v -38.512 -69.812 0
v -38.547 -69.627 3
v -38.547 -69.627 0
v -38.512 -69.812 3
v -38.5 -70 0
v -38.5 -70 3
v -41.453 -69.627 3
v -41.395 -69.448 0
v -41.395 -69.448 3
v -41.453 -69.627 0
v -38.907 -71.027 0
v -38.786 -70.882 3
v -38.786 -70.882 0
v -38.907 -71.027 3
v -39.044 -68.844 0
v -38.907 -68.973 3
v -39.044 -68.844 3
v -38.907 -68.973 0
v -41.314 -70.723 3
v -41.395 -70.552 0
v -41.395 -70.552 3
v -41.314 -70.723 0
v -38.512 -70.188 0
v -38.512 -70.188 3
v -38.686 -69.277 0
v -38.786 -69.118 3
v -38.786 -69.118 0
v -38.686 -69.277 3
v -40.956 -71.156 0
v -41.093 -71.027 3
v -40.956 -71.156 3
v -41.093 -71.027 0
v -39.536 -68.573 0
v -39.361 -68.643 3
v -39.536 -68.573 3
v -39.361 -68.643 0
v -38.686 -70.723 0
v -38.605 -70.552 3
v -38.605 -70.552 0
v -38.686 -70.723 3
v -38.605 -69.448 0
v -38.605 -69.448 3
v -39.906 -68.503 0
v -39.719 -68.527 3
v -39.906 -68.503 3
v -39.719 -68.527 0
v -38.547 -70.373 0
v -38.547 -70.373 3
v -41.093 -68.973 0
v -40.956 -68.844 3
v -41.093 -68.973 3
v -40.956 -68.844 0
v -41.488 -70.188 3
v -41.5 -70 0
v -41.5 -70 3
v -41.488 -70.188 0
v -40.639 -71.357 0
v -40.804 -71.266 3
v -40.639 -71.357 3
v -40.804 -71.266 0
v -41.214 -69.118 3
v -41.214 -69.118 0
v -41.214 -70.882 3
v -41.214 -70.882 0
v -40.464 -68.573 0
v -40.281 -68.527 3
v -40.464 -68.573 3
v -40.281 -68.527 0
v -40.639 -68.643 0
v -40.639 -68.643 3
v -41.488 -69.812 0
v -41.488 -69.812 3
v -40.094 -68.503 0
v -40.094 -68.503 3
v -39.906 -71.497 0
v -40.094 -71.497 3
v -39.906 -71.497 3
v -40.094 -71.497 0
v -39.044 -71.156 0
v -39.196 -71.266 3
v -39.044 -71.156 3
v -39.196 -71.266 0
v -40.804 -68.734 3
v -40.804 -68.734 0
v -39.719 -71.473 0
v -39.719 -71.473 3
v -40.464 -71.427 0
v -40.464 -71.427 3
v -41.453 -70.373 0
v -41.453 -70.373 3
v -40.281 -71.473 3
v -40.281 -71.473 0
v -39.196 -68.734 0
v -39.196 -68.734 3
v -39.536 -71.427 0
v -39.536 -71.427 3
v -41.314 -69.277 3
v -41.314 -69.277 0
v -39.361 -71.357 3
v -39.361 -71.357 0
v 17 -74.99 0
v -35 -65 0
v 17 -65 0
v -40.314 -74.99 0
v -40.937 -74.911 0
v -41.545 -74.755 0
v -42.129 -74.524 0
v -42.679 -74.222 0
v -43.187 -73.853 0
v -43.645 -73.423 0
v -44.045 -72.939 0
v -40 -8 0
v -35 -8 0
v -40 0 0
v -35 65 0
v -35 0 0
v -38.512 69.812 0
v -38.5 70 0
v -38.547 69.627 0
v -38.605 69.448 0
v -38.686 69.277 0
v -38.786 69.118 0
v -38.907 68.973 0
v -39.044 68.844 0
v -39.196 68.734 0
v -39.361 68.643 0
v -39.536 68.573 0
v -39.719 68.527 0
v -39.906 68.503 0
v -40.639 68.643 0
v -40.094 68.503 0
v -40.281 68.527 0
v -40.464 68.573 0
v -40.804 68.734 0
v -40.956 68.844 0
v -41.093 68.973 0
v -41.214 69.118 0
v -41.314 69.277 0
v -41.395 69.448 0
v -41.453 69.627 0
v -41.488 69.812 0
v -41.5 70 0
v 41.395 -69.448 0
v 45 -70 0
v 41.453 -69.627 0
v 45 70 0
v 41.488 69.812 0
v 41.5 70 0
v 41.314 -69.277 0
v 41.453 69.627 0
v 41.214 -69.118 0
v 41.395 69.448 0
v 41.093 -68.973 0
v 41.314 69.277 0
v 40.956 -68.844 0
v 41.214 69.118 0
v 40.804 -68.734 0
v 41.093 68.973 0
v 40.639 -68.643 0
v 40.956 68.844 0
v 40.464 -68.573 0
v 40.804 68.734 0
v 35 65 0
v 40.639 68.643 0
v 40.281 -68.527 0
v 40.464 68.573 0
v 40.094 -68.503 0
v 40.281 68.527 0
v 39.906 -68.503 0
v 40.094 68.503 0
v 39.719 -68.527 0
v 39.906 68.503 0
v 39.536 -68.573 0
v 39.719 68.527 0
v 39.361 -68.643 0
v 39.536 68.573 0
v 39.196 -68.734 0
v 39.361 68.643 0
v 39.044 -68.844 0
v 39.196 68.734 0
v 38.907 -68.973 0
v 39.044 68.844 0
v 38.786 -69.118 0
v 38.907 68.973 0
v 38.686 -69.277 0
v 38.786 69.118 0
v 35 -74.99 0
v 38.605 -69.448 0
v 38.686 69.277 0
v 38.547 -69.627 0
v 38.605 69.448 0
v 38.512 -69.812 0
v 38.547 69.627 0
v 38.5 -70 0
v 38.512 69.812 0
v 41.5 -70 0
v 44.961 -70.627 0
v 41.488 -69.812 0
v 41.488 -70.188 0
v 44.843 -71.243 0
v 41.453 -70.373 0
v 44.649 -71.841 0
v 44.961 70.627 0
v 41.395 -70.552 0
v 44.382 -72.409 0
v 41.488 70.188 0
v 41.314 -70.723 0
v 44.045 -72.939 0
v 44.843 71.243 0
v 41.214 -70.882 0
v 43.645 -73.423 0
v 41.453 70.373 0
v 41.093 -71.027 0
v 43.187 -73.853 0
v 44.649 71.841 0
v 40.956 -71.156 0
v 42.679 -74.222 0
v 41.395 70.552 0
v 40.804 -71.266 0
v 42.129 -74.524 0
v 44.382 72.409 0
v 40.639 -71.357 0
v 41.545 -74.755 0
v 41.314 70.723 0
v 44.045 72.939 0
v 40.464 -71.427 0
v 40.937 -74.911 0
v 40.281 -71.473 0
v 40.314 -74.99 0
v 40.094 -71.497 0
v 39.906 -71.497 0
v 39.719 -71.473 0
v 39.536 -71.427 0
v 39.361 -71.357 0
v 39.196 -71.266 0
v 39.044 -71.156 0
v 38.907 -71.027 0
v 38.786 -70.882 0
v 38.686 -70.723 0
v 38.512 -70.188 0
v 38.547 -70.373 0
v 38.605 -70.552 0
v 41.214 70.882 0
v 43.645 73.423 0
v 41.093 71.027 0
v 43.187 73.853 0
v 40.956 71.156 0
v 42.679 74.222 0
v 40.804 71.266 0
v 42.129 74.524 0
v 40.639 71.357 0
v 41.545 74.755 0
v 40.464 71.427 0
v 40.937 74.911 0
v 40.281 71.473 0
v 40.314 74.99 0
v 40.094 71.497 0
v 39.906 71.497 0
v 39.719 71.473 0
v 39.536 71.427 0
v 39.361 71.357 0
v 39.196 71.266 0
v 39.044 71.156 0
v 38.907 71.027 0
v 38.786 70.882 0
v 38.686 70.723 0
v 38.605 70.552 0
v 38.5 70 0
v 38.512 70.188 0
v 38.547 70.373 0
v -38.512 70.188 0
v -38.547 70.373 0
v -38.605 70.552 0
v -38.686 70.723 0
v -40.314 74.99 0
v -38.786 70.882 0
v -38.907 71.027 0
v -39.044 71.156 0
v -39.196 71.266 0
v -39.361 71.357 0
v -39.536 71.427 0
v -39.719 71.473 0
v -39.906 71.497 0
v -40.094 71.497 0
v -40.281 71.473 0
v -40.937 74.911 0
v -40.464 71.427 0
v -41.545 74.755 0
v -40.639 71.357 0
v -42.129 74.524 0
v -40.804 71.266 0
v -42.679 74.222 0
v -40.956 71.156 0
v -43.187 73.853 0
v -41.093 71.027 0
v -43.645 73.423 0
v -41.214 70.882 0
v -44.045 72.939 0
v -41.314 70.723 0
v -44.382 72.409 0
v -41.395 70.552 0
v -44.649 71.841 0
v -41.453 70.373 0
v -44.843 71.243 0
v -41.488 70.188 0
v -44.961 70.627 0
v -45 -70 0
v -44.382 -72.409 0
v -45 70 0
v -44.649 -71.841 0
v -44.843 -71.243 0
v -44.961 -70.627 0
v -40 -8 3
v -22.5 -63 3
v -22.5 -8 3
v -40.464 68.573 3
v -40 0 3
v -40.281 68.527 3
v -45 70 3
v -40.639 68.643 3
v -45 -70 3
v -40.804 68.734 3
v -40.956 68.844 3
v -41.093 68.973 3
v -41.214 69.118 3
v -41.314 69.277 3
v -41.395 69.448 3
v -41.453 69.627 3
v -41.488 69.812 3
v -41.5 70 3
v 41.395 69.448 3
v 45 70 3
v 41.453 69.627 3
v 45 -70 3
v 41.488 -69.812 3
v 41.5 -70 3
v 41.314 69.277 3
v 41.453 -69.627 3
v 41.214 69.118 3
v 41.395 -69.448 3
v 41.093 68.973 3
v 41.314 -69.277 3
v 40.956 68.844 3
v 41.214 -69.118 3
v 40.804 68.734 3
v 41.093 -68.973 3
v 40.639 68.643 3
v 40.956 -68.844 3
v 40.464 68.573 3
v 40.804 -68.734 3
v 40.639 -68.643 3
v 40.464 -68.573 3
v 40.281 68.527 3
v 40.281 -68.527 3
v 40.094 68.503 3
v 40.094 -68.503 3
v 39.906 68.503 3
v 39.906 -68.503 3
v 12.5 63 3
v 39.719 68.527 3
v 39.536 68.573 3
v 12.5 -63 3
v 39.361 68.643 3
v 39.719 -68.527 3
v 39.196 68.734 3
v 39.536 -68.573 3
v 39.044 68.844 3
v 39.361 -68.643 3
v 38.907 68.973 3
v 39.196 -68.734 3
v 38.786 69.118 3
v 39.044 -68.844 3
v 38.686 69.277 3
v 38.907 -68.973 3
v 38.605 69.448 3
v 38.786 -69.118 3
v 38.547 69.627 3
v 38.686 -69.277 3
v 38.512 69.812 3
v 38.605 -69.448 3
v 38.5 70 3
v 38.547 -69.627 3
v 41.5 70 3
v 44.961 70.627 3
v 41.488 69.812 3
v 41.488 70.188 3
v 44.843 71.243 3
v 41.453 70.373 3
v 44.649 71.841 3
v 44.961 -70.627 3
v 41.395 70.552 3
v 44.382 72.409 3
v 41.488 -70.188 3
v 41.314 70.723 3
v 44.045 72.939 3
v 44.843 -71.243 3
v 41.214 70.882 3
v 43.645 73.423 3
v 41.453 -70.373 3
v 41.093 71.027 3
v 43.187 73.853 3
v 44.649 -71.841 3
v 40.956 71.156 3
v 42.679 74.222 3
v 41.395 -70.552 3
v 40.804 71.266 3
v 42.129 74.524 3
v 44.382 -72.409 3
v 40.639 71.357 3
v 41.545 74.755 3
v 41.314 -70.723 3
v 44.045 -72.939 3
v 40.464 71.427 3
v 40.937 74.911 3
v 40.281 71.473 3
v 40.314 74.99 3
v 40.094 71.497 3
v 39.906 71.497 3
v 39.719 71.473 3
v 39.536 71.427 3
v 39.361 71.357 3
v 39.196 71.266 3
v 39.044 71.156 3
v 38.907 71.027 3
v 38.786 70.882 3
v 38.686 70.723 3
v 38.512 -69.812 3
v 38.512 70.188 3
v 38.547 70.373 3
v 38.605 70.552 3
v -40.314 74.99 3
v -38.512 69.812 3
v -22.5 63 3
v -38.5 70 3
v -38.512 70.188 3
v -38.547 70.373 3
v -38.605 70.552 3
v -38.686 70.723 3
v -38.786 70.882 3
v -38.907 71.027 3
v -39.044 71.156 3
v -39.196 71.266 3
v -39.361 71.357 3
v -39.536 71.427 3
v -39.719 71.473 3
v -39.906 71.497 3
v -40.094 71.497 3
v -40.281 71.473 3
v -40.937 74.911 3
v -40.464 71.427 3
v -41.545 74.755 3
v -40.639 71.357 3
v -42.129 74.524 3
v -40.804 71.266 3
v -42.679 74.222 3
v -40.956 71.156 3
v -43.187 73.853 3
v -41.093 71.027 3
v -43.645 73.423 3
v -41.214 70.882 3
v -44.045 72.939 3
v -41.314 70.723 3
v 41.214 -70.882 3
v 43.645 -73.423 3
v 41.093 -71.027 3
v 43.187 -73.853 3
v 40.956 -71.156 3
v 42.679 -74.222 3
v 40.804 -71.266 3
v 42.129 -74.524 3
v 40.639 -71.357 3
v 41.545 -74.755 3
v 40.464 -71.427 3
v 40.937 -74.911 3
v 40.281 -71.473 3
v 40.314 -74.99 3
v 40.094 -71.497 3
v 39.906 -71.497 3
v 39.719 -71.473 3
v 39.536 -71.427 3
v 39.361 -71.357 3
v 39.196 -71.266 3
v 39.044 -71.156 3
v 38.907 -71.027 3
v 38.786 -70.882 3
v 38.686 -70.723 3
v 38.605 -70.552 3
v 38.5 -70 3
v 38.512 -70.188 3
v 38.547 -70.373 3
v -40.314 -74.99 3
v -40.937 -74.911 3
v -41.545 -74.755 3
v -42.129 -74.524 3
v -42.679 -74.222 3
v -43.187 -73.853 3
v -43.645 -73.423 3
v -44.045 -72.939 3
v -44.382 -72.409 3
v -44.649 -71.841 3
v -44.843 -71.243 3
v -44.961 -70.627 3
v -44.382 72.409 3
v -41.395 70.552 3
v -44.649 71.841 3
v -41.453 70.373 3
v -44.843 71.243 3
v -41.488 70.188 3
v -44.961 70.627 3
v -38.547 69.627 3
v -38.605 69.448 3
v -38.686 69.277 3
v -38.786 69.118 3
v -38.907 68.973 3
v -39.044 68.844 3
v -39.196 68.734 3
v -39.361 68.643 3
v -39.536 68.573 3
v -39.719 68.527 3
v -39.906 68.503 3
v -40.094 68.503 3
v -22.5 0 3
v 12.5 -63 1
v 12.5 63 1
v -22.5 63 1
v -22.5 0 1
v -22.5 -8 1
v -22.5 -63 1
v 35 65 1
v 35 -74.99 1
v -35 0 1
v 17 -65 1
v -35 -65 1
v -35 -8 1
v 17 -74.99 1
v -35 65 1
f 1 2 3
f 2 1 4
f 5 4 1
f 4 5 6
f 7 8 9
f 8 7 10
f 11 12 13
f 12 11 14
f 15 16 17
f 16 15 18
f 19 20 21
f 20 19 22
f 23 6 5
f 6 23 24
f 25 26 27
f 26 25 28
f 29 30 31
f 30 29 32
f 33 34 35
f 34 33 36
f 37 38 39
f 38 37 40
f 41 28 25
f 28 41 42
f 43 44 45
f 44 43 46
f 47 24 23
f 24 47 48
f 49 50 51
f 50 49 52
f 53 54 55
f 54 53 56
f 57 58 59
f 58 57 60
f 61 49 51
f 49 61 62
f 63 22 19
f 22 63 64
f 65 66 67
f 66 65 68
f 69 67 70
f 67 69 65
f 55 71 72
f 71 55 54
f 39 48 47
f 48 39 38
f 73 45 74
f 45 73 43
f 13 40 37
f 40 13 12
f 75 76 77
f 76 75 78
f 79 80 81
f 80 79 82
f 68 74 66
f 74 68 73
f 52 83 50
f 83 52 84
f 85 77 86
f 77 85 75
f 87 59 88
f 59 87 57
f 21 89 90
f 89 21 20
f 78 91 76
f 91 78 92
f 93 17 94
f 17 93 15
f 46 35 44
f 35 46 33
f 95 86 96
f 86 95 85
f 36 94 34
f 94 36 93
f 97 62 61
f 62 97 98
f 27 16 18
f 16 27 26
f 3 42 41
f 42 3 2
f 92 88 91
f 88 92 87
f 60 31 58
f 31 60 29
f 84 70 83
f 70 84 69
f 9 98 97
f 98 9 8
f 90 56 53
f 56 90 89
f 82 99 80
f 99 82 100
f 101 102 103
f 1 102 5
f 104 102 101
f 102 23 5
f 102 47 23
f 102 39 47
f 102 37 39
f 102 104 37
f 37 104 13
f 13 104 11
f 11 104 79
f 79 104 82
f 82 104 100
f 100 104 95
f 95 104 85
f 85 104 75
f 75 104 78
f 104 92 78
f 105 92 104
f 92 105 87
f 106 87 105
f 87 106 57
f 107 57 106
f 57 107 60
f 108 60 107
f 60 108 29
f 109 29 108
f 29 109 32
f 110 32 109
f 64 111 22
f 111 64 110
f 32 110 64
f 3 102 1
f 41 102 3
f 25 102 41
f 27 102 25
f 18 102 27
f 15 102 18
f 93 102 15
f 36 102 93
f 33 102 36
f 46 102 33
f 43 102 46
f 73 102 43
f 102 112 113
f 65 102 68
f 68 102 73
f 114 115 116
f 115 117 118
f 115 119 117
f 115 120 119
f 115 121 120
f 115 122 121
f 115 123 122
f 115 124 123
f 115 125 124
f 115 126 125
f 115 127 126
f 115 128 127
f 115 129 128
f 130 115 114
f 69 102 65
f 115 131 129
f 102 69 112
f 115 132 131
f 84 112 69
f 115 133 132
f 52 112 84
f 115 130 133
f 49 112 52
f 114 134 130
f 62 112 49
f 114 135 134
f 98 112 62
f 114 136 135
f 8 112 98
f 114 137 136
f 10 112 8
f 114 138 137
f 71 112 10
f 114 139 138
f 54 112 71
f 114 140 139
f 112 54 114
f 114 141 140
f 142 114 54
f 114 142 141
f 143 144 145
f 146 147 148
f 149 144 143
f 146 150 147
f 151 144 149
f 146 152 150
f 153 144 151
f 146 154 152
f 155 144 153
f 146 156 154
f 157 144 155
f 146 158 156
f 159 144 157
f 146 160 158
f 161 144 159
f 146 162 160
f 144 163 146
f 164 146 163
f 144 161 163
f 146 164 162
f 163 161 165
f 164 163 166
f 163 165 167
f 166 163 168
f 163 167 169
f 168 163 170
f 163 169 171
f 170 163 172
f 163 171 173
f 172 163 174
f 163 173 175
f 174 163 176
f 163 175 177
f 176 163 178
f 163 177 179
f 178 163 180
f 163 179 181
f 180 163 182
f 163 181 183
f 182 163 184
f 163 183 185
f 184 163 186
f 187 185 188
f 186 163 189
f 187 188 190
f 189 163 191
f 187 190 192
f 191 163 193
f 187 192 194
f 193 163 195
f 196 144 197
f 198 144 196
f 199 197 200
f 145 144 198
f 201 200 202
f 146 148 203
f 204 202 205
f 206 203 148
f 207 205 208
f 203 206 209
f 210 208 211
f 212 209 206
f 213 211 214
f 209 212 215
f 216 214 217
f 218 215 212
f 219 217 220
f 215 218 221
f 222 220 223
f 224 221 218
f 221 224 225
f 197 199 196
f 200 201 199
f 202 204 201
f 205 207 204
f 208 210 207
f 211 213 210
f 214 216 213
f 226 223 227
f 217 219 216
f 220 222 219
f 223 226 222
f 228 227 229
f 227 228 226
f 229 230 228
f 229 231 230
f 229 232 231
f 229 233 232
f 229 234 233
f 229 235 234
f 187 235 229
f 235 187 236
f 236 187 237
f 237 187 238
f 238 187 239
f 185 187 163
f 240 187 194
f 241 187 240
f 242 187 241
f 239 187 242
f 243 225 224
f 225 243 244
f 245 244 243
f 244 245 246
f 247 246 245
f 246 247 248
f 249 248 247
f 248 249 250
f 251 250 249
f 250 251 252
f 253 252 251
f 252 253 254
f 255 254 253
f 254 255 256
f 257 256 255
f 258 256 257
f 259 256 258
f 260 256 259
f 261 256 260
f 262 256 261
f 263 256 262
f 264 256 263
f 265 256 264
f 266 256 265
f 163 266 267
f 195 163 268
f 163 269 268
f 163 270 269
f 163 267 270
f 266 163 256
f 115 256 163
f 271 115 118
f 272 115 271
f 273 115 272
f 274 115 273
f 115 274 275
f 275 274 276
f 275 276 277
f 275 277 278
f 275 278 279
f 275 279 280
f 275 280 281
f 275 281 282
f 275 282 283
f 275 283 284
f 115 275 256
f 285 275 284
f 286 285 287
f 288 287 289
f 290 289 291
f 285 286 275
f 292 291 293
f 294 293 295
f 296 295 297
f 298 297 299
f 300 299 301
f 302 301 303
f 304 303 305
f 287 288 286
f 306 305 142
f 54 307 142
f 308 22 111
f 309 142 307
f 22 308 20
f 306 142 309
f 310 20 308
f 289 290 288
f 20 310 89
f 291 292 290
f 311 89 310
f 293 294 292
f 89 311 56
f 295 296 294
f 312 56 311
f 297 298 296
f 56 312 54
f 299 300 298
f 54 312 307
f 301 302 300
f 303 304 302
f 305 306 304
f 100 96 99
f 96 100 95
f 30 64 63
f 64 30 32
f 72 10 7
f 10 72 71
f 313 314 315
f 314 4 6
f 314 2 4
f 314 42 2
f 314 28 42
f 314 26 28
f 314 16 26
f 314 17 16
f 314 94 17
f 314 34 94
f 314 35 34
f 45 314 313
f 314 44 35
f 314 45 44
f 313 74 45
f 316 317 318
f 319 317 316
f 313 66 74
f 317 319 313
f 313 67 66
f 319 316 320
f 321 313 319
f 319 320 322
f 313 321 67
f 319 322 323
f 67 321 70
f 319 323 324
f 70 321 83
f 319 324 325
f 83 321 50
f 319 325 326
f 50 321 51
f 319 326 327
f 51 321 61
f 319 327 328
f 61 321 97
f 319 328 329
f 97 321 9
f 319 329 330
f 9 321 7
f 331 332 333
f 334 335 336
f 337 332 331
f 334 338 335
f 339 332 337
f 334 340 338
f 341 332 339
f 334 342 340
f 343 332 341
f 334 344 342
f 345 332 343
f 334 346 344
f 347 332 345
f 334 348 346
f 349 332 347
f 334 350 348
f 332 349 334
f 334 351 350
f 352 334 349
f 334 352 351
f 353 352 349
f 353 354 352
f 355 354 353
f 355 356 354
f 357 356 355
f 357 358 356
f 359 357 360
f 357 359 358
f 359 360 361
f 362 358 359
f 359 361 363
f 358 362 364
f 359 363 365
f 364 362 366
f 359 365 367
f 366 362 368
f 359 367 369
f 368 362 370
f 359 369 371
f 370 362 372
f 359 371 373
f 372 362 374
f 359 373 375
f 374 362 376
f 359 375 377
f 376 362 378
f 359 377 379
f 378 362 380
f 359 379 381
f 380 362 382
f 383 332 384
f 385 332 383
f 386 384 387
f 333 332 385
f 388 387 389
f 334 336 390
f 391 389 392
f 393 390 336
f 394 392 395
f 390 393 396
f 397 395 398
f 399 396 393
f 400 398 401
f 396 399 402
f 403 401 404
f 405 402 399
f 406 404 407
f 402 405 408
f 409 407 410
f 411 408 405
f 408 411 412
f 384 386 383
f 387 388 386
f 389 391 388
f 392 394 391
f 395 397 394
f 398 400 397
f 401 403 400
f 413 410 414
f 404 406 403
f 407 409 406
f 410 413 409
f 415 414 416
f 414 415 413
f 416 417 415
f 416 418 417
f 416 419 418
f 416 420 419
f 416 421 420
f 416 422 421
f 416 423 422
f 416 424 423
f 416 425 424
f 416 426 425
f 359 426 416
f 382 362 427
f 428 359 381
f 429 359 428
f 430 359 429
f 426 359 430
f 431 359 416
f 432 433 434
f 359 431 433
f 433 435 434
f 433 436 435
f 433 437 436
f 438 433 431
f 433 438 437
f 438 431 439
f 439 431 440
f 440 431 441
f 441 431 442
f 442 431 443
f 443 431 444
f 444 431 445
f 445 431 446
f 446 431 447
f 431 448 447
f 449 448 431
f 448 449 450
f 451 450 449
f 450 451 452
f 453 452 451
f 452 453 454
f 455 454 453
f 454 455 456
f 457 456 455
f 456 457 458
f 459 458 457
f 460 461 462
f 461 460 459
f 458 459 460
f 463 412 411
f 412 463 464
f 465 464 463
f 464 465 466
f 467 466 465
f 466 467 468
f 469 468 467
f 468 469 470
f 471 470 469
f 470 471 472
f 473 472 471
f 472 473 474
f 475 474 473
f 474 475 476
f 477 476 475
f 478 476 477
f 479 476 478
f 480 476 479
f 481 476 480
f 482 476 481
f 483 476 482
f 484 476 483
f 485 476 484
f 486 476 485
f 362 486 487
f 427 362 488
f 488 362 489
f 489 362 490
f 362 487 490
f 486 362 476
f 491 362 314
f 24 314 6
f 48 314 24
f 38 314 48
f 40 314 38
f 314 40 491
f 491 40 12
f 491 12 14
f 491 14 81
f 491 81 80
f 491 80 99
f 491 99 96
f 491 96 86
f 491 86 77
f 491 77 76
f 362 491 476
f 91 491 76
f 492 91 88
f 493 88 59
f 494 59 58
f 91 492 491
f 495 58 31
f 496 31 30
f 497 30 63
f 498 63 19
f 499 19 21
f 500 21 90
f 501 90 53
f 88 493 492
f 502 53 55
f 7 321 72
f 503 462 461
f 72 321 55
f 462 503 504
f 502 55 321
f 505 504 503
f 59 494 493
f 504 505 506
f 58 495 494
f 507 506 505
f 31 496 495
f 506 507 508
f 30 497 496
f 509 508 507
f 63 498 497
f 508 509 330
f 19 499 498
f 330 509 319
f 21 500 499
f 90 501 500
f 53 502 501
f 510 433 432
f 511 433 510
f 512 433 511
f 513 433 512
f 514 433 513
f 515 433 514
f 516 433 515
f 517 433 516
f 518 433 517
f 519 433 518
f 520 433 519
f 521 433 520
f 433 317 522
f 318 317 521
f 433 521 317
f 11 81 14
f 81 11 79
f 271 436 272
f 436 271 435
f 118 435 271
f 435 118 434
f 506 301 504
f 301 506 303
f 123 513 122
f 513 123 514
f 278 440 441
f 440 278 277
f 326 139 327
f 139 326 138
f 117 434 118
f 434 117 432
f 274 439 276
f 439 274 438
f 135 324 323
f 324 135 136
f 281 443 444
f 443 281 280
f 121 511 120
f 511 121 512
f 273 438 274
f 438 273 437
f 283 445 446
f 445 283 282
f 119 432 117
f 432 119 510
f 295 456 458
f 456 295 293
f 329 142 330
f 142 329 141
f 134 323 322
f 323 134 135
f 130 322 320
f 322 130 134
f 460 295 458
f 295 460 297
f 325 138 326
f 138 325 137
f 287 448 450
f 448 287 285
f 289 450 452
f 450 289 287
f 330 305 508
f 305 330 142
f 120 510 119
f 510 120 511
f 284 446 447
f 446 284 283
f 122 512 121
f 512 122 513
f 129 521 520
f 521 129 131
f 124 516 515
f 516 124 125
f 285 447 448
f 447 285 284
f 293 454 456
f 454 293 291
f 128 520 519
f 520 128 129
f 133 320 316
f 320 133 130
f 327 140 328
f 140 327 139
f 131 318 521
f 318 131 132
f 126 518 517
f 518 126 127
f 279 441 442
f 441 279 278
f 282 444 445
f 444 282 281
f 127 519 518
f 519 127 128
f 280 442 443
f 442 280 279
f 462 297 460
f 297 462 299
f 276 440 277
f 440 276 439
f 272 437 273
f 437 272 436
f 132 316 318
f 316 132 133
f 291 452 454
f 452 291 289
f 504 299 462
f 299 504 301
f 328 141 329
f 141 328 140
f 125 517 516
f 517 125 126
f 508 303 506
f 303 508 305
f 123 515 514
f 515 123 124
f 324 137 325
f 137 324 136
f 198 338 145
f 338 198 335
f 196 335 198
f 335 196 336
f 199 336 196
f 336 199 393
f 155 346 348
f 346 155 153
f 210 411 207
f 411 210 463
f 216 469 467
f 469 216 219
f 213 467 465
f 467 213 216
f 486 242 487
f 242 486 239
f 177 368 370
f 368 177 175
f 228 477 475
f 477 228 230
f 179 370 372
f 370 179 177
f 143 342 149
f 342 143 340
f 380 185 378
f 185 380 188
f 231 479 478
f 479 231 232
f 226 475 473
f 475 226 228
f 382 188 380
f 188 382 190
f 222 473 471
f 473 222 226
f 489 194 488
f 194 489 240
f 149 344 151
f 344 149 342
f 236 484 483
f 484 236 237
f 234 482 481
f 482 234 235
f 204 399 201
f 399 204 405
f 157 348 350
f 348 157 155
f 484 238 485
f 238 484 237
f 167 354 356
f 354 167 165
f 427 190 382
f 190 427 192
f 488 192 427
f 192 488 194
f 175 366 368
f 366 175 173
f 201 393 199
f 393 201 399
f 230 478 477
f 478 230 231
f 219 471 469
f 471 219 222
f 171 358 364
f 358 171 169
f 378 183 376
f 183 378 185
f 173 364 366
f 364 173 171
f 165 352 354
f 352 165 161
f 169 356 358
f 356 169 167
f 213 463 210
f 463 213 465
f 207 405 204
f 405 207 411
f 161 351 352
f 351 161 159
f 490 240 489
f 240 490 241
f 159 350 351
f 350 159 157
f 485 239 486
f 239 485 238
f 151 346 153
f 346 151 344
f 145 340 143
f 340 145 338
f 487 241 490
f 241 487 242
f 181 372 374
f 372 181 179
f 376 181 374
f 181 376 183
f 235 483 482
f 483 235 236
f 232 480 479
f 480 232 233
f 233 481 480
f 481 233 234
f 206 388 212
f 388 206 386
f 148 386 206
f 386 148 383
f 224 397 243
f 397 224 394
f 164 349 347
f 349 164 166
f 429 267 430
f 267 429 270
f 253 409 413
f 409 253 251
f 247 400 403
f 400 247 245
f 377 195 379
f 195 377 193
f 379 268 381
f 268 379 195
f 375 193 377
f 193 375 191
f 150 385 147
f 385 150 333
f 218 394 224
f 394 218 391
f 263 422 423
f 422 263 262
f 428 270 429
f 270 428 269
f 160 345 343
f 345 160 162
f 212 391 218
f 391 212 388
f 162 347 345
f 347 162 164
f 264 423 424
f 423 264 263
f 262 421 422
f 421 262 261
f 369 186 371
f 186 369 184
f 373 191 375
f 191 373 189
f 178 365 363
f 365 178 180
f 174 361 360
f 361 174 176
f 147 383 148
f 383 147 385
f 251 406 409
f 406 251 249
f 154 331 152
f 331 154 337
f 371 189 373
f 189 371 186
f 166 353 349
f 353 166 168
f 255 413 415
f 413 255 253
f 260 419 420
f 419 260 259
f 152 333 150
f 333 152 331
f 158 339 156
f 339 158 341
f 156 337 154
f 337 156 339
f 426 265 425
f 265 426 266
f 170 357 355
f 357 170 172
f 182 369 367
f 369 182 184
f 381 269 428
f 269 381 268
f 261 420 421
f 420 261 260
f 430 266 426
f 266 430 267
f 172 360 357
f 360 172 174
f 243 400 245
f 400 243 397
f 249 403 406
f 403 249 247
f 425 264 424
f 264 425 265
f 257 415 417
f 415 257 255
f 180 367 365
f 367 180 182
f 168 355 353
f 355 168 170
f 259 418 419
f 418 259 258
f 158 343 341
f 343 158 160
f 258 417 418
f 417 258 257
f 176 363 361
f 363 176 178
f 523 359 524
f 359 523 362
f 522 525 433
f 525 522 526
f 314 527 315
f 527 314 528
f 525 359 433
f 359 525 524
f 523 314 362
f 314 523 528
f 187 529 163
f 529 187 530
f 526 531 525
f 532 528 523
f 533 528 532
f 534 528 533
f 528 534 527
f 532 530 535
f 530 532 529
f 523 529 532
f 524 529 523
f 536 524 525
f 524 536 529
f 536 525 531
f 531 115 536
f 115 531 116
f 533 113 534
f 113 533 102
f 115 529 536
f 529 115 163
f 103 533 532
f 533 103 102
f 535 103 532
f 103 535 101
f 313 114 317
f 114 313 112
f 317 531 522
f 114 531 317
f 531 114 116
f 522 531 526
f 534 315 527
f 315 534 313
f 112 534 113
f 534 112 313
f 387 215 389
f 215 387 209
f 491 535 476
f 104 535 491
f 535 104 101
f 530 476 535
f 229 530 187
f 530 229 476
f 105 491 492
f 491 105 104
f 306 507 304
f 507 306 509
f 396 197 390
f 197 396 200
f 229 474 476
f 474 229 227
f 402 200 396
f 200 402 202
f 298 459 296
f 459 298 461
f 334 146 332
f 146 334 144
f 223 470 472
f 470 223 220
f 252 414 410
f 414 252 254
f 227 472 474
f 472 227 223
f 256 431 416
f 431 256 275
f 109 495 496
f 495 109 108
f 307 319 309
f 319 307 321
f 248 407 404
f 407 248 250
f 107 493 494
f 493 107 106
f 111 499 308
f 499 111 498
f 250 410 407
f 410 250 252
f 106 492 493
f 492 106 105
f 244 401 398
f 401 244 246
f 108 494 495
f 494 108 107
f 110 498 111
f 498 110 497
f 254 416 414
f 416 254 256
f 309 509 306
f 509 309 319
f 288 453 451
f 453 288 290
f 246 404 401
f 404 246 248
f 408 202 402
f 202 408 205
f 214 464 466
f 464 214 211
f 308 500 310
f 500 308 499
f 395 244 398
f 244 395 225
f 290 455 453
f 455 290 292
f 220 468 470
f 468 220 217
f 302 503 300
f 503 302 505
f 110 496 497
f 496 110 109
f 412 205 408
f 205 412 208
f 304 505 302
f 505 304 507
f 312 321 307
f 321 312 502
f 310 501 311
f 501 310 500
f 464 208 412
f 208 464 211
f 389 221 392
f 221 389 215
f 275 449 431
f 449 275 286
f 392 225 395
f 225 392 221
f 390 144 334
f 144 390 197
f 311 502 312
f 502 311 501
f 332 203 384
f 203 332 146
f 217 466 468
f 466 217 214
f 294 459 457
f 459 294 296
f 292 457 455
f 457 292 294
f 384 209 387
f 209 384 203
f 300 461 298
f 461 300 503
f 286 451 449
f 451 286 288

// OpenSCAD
HEATSINK_WIDTH = 70;
HEATSINK_LENGTH = 130;
HEATSINK_THICKNESS = 10;
HEATSINK_OFFSET_Z = -1;

HEATSINK_CUTOUT_WIDTH = 18;
HEATSINK_CUTOUT_LENGTH = 15;

LED_WIDTH = 35;
LED_LENGTH = 126;
LED_THICKNESS = 10;
LED_OFFSET_X = -5;

WIRE_CHANNEL_WIDTH = 8;
WIRE_CHANNEL_OFFSET_X = -5;
WIRE_CHANNEL_OFFSET_Y = -4;

WIDTH = 90;
LENGTH = 150;
CORNER_DIA = 10;
THICKNESS = 3;

MOUNT_HOLE_DIA = 3;
MOUNT_HOLE_SPACING_X = 80;
MOUNT_HOLE_SPACING_Y = 140;

$fn = 50;

module leds() {
  union() {
    translate([-LED_WIDTH/2 + LED_OFFSET_X, -LED_LENGTH/2, 0])
    cube(size = [LED_WIDTH, LED_LENGTH, LED_THICKNESS + HEATSINK_THICKNESS]);
    translate([-HEATSINK_WIDTH/2, -HEATSINK_LENGTH/2, 0])
    cube(size = [HEATSINK_WIDTH, HEATSINK_LENGTH, HEATSINK_THICKNESS]);

    translate([HEATSINK_WIDTH/2 -HEATSINK_CUTOUT_WIDTH, -HEATSINK_LENGTH/2 - HEATSINK_CUTOUT_LENGTH, 0])
    cube(size = [HEATSINK_CUTOUT_WIDTH, HEATSINK_CUTOUT_LENGTH, HEATSINK_THICKNESS]);

    translate([-HEATSINK_WIDTH/2 + WIRE_CHANNEL_OFFSET_X, -WIRE_CHANNEL_WIDTH/2 + WIRE_CHANNEL_OFFSET_Y, 0])
    cube(size = [HEATSINK_WIDTH/2, WIRE_CHANNEL_WIDTH, LED_THICKNESS + HEATSINK_THICKNESS]);
  }
}

module mount_holes(width, length, height, dia) {
  for(i = [-1, 1]) {
    for(j = [-1, 1]) {
      translate([i * width/2, j * length/2, 0])
      cylinder(d = dia, h = height);
    }
  }
}

module adapter() {
  difference() {
    hull()
    mount_holes(WIDTH - CORNER_DIA, LENGTH - CORNER_DIA, THICKNESS, CORNER_DIA);

    #mount_holes(MOUNT_HOLE_SPACING_X, MOUNT_HOLE_SPACING_Y, THICKNESS, MOUNT_HOLE_DIA);

    #translate([0, 0, -HEATSINK_THICKNESS - HEATSINK_OFFSET_Z])
    leds();
  }
}

adapter();
